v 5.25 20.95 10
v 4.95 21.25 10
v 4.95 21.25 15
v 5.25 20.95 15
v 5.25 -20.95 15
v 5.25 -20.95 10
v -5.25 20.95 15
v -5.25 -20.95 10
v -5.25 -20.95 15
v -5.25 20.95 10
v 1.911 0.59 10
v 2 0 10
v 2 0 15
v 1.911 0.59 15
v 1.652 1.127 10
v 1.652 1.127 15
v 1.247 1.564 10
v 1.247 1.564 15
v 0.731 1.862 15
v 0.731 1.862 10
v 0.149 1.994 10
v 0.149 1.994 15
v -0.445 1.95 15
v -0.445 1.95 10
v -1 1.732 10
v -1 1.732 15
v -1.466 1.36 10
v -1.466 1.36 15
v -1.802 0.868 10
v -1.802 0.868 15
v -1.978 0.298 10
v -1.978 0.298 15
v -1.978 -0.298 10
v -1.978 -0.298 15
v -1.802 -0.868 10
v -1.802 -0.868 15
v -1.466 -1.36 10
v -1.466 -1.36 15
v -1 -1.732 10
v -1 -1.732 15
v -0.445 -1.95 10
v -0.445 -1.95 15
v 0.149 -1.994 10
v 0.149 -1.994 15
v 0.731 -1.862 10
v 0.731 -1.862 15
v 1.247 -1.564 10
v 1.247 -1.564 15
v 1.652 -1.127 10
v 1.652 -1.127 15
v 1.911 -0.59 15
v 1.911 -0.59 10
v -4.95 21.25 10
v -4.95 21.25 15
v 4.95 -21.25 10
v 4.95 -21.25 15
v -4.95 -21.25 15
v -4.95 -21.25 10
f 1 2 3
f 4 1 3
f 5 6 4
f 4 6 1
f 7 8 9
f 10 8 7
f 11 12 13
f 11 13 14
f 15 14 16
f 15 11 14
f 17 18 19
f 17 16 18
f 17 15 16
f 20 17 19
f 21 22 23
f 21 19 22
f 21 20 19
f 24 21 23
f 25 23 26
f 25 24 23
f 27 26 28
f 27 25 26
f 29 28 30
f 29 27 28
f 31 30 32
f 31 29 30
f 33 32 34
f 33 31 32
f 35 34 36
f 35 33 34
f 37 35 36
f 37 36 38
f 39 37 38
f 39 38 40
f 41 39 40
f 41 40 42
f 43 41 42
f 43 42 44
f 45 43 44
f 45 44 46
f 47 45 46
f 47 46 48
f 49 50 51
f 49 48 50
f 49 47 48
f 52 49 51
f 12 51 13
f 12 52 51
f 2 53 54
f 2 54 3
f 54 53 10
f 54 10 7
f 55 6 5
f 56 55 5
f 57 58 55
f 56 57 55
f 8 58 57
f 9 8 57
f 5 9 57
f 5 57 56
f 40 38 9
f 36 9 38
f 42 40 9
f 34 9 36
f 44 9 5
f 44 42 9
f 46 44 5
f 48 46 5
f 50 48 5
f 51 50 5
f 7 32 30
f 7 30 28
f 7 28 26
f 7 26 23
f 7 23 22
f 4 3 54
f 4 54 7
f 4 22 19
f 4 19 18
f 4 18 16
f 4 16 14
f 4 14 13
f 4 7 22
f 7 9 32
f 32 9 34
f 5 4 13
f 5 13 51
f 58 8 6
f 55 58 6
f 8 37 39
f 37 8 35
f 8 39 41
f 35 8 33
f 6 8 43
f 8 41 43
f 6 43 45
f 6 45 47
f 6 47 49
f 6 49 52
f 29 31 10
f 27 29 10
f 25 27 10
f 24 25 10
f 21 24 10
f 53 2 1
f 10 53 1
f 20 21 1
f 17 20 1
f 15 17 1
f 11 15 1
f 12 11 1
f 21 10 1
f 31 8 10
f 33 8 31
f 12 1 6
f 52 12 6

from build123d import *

# Parameters (mm, degrees)
CYLINDER001_R     = 2
CYLINDER001_DEPTH = 12
BOX012_W          = 10.5
BOX012_H          = 42.5
BOX012_DEPTH      = 5
CHAMFER005_SIZE   = 0.3


with BuildPart() as m4_tap:
    # Cylinder001 → Cylinder001 (new body)
    with BuildSketch(Plane.XY.offset(5)):
        Circle(CYLINDER001_R)
    extrude(amount=CYLINDER001_DEPTH)


with BuildPart() as cut:
    # Box012 → Box012 (new body)
    with BuildSketch(Plane(origin=(-5.25, -21.25, 0), x_dir=(1, 0, 0), z_dir=(0, 0, 1))):
        with Locations((5.25, 21.25)):
            Rectangle(BOX012_W, BOX012_H)
    extrude(amount=BOX012_DEPTH)

    # Chamfer005
    chamfer005_edges = [cut.edges().sort_by_distance(p)[0] for p in [
        (-5.25, -21.25, 2.5),
        (-5.25, 21.25, 2.5),
        (5.25, -21.25, 2.5),
        (5.25, 21.25, 2.5),
    ]]
    chamfer(chamfer005_edges, length=CHAMFER005_SIZE)


with BuildPart() as cut_1:
    # Chamfer005 placement: moved
    add(cut.part.moved(Location((0, 0, 10))))

    # Cut: cut M4-tap
    add(m4_tap.part, mode=Mode.SUBTRACT)


solid = cut_1.part
